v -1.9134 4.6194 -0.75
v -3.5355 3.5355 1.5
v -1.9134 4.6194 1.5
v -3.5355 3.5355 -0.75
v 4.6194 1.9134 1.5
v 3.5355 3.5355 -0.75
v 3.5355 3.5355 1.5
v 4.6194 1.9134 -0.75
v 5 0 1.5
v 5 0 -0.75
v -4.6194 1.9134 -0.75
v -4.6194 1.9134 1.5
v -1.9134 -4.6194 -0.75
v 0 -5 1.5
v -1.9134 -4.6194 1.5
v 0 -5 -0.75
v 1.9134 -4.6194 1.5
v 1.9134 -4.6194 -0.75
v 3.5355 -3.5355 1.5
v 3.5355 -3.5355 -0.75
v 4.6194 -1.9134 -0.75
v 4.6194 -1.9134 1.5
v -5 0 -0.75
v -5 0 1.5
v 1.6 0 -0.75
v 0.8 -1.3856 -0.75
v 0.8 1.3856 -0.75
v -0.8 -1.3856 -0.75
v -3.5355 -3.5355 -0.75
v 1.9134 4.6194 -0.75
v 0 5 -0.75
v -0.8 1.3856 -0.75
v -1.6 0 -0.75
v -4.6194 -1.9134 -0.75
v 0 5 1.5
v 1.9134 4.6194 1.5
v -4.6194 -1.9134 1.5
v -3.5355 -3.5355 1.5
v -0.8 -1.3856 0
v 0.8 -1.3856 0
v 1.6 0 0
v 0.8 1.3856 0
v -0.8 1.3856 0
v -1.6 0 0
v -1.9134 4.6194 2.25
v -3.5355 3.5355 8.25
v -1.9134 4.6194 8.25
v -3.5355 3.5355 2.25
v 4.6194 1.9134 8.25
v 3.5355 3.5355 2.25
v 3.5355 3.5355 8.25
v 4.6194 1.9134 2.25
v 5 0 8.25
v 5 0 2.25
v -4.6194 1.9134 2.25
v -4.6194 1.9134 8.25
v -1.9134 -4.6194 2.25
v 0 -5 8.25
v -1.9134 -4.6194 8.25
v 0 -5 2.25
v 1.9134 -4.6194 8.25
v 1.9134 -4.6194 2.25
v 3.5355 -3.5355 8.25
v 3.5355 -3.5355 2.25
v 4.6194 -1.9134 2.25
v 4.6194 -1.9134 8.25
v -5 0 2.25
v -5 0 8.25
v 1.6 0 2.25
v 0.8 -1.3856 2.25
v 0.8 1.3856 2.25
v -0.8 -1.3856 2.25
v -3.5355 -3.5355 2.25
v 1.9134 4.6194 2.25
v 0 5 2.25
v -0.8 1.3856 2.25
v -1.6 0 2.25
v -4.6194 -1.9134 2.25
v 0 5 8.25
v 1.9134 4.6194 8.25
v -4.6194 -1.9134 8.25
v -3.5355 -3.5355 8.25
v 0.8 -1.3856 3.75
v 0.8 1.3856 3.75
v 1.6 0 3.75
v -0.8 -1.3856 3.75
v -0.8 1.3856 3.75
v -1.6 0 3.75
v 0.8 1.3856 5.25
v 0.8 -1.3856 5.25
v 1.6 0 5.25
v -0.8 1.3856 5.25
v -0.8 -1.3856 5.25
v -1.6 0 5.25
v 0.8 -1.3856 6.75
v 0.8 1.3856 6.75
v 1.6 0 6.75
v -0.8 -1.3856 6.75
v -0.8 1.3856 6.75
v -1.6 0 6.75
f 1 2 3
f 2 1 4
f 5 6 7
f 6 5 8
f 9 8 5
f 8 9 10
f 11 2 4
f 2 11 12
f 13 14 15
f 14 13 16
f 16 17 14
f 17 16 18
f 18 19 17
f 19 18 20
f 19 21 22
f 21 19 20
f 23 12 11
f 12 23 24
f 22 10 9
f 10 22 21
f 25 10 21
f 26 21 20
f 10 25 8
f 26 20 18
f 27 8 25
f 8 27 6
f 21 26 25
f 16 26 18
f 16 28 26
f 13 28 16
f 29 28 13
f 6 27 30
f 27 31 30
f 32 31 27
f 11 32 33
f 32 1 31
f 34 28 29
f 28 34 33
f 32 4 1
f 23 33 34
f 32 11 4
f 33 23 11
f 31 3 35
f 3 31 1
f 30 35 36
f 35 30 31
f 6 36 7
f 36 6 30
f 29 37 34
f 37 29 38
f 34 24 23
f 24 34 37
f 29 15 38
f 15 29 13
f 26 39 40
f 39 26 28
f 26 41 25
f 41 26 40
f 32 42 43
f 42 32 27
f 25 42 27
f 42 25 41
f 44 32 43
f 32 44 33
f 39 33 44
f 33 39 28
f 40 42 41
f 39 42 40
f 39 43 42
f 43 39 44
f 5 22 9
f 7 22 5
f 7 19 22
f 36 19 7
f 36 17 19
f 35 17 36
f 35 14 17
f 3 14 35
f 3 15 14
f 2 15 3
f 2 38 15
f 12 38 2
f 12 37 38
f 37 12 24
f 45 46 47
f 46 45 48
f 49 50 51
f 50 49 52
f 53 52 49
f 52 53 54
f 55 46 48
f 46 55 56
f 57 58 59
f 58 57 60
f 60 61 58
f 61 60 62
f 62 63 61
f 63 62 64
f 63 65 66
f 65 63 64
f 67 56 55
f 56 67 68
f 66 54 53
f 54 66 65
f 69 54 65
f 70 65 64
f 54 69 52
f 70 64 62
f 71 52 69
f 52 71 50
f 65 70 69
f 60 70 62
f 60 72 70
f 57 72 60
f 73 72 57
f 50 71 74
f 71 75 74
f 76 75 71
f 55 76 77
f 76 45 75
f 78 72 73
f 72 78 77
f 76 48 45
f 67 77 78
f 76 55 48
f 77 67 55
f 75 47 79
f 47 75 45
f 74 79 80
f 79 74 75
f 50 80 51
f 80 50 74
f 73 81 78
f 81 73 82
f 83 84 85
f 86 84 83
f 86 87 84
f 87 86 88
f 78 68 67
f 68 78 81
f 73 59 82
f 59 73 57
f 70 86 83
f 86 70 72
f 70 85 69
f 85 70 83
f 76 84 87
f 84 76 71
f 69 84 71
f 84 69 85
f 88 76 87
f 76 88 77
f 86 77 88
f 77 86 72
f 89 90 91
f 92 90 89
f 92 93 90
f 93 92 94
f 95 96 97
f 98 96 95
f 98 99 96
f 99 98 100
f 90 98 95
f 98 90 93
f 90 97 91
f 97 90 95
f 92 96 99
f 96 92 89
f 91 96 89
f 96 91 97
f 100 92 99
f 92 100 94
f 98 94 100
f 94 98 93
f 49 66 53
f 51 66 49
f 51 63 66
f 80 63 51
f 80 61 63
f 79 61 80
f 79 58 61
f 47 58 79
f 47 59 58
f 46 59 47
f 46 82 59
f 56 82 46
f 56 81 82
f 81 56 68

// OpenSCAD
// Parameters
inner_diameter_mm = 3; //[1.5:6:0.1]
outer_diameter_mm = 10; //[5:20:0.1]
thickness_mm = 1.5; //[0.75:3:0.05]
hole_clearance_mm = 0.2; //[0:0.6:0.05]
overlap_mm = 0.8; //[0.5:2:0.1]

// Washer - base geometry
module washer_solid() {
  color([0.2, 0.2, 0.2]) { // Rubber color
    difference() {
      cylinder(r=outer_diameter_mm/2, h=thickness_mm, center=true);
      cylinder(r=(inner_diameter_mm + hole_clearance_mm)/2, h=thickness_mm + 2*overlap_mm, center=true);
    }
  }
}

// Round Grommet Top - detailed geometry
module round_grommet_top() {
  color([0.2, 0.2, 0.2]) {
    translate([0, 0, thickness_mm/2]) {
      cylinder(r=outer_diameter_mm/2, h=thickness_mm, center=true);
    }
  }
}

// Round Grommet Assembly - detailed geometry
module round_grommet_assembly() {
  color([0.2, 0.2, 0.2]) {
    union() {
      washer_solid();
      round_grommet_top();
    }
  }
}

// Nut And Washer - detailed geometry
module nut_and_washer() {
  color([0.4, 0.4, 0.43]) { // Steel color
    union() {
      washer_solid();
      translate([0, 0, thickness_mm]) {
        cylinder(r=outer_diameter_mm/2, h=thickness_mm, center=true);
      }
    }
  }
}

// Screw And Washer - detailed geometry
module screw_and_washer() {
  color([0.4, 0.4, 0.43]) {
    union() {
      washer_solid();
      translate([0, 0, thickness_mm]) {
        cylinder(r=outer_diameter_mm/2, h=thickness_mm, center=true);
      }
    }
  }
}

// Assembly - combines all parts
module assembly() {
  translate([0, 0, 0]) round_grommet_assembly();
  translate([0, 0, thickness_mm * 2]) nut_and_washer();
  translate([0, 0, thickness_mm * 4]) screw_and_washer();
}

assembly();
